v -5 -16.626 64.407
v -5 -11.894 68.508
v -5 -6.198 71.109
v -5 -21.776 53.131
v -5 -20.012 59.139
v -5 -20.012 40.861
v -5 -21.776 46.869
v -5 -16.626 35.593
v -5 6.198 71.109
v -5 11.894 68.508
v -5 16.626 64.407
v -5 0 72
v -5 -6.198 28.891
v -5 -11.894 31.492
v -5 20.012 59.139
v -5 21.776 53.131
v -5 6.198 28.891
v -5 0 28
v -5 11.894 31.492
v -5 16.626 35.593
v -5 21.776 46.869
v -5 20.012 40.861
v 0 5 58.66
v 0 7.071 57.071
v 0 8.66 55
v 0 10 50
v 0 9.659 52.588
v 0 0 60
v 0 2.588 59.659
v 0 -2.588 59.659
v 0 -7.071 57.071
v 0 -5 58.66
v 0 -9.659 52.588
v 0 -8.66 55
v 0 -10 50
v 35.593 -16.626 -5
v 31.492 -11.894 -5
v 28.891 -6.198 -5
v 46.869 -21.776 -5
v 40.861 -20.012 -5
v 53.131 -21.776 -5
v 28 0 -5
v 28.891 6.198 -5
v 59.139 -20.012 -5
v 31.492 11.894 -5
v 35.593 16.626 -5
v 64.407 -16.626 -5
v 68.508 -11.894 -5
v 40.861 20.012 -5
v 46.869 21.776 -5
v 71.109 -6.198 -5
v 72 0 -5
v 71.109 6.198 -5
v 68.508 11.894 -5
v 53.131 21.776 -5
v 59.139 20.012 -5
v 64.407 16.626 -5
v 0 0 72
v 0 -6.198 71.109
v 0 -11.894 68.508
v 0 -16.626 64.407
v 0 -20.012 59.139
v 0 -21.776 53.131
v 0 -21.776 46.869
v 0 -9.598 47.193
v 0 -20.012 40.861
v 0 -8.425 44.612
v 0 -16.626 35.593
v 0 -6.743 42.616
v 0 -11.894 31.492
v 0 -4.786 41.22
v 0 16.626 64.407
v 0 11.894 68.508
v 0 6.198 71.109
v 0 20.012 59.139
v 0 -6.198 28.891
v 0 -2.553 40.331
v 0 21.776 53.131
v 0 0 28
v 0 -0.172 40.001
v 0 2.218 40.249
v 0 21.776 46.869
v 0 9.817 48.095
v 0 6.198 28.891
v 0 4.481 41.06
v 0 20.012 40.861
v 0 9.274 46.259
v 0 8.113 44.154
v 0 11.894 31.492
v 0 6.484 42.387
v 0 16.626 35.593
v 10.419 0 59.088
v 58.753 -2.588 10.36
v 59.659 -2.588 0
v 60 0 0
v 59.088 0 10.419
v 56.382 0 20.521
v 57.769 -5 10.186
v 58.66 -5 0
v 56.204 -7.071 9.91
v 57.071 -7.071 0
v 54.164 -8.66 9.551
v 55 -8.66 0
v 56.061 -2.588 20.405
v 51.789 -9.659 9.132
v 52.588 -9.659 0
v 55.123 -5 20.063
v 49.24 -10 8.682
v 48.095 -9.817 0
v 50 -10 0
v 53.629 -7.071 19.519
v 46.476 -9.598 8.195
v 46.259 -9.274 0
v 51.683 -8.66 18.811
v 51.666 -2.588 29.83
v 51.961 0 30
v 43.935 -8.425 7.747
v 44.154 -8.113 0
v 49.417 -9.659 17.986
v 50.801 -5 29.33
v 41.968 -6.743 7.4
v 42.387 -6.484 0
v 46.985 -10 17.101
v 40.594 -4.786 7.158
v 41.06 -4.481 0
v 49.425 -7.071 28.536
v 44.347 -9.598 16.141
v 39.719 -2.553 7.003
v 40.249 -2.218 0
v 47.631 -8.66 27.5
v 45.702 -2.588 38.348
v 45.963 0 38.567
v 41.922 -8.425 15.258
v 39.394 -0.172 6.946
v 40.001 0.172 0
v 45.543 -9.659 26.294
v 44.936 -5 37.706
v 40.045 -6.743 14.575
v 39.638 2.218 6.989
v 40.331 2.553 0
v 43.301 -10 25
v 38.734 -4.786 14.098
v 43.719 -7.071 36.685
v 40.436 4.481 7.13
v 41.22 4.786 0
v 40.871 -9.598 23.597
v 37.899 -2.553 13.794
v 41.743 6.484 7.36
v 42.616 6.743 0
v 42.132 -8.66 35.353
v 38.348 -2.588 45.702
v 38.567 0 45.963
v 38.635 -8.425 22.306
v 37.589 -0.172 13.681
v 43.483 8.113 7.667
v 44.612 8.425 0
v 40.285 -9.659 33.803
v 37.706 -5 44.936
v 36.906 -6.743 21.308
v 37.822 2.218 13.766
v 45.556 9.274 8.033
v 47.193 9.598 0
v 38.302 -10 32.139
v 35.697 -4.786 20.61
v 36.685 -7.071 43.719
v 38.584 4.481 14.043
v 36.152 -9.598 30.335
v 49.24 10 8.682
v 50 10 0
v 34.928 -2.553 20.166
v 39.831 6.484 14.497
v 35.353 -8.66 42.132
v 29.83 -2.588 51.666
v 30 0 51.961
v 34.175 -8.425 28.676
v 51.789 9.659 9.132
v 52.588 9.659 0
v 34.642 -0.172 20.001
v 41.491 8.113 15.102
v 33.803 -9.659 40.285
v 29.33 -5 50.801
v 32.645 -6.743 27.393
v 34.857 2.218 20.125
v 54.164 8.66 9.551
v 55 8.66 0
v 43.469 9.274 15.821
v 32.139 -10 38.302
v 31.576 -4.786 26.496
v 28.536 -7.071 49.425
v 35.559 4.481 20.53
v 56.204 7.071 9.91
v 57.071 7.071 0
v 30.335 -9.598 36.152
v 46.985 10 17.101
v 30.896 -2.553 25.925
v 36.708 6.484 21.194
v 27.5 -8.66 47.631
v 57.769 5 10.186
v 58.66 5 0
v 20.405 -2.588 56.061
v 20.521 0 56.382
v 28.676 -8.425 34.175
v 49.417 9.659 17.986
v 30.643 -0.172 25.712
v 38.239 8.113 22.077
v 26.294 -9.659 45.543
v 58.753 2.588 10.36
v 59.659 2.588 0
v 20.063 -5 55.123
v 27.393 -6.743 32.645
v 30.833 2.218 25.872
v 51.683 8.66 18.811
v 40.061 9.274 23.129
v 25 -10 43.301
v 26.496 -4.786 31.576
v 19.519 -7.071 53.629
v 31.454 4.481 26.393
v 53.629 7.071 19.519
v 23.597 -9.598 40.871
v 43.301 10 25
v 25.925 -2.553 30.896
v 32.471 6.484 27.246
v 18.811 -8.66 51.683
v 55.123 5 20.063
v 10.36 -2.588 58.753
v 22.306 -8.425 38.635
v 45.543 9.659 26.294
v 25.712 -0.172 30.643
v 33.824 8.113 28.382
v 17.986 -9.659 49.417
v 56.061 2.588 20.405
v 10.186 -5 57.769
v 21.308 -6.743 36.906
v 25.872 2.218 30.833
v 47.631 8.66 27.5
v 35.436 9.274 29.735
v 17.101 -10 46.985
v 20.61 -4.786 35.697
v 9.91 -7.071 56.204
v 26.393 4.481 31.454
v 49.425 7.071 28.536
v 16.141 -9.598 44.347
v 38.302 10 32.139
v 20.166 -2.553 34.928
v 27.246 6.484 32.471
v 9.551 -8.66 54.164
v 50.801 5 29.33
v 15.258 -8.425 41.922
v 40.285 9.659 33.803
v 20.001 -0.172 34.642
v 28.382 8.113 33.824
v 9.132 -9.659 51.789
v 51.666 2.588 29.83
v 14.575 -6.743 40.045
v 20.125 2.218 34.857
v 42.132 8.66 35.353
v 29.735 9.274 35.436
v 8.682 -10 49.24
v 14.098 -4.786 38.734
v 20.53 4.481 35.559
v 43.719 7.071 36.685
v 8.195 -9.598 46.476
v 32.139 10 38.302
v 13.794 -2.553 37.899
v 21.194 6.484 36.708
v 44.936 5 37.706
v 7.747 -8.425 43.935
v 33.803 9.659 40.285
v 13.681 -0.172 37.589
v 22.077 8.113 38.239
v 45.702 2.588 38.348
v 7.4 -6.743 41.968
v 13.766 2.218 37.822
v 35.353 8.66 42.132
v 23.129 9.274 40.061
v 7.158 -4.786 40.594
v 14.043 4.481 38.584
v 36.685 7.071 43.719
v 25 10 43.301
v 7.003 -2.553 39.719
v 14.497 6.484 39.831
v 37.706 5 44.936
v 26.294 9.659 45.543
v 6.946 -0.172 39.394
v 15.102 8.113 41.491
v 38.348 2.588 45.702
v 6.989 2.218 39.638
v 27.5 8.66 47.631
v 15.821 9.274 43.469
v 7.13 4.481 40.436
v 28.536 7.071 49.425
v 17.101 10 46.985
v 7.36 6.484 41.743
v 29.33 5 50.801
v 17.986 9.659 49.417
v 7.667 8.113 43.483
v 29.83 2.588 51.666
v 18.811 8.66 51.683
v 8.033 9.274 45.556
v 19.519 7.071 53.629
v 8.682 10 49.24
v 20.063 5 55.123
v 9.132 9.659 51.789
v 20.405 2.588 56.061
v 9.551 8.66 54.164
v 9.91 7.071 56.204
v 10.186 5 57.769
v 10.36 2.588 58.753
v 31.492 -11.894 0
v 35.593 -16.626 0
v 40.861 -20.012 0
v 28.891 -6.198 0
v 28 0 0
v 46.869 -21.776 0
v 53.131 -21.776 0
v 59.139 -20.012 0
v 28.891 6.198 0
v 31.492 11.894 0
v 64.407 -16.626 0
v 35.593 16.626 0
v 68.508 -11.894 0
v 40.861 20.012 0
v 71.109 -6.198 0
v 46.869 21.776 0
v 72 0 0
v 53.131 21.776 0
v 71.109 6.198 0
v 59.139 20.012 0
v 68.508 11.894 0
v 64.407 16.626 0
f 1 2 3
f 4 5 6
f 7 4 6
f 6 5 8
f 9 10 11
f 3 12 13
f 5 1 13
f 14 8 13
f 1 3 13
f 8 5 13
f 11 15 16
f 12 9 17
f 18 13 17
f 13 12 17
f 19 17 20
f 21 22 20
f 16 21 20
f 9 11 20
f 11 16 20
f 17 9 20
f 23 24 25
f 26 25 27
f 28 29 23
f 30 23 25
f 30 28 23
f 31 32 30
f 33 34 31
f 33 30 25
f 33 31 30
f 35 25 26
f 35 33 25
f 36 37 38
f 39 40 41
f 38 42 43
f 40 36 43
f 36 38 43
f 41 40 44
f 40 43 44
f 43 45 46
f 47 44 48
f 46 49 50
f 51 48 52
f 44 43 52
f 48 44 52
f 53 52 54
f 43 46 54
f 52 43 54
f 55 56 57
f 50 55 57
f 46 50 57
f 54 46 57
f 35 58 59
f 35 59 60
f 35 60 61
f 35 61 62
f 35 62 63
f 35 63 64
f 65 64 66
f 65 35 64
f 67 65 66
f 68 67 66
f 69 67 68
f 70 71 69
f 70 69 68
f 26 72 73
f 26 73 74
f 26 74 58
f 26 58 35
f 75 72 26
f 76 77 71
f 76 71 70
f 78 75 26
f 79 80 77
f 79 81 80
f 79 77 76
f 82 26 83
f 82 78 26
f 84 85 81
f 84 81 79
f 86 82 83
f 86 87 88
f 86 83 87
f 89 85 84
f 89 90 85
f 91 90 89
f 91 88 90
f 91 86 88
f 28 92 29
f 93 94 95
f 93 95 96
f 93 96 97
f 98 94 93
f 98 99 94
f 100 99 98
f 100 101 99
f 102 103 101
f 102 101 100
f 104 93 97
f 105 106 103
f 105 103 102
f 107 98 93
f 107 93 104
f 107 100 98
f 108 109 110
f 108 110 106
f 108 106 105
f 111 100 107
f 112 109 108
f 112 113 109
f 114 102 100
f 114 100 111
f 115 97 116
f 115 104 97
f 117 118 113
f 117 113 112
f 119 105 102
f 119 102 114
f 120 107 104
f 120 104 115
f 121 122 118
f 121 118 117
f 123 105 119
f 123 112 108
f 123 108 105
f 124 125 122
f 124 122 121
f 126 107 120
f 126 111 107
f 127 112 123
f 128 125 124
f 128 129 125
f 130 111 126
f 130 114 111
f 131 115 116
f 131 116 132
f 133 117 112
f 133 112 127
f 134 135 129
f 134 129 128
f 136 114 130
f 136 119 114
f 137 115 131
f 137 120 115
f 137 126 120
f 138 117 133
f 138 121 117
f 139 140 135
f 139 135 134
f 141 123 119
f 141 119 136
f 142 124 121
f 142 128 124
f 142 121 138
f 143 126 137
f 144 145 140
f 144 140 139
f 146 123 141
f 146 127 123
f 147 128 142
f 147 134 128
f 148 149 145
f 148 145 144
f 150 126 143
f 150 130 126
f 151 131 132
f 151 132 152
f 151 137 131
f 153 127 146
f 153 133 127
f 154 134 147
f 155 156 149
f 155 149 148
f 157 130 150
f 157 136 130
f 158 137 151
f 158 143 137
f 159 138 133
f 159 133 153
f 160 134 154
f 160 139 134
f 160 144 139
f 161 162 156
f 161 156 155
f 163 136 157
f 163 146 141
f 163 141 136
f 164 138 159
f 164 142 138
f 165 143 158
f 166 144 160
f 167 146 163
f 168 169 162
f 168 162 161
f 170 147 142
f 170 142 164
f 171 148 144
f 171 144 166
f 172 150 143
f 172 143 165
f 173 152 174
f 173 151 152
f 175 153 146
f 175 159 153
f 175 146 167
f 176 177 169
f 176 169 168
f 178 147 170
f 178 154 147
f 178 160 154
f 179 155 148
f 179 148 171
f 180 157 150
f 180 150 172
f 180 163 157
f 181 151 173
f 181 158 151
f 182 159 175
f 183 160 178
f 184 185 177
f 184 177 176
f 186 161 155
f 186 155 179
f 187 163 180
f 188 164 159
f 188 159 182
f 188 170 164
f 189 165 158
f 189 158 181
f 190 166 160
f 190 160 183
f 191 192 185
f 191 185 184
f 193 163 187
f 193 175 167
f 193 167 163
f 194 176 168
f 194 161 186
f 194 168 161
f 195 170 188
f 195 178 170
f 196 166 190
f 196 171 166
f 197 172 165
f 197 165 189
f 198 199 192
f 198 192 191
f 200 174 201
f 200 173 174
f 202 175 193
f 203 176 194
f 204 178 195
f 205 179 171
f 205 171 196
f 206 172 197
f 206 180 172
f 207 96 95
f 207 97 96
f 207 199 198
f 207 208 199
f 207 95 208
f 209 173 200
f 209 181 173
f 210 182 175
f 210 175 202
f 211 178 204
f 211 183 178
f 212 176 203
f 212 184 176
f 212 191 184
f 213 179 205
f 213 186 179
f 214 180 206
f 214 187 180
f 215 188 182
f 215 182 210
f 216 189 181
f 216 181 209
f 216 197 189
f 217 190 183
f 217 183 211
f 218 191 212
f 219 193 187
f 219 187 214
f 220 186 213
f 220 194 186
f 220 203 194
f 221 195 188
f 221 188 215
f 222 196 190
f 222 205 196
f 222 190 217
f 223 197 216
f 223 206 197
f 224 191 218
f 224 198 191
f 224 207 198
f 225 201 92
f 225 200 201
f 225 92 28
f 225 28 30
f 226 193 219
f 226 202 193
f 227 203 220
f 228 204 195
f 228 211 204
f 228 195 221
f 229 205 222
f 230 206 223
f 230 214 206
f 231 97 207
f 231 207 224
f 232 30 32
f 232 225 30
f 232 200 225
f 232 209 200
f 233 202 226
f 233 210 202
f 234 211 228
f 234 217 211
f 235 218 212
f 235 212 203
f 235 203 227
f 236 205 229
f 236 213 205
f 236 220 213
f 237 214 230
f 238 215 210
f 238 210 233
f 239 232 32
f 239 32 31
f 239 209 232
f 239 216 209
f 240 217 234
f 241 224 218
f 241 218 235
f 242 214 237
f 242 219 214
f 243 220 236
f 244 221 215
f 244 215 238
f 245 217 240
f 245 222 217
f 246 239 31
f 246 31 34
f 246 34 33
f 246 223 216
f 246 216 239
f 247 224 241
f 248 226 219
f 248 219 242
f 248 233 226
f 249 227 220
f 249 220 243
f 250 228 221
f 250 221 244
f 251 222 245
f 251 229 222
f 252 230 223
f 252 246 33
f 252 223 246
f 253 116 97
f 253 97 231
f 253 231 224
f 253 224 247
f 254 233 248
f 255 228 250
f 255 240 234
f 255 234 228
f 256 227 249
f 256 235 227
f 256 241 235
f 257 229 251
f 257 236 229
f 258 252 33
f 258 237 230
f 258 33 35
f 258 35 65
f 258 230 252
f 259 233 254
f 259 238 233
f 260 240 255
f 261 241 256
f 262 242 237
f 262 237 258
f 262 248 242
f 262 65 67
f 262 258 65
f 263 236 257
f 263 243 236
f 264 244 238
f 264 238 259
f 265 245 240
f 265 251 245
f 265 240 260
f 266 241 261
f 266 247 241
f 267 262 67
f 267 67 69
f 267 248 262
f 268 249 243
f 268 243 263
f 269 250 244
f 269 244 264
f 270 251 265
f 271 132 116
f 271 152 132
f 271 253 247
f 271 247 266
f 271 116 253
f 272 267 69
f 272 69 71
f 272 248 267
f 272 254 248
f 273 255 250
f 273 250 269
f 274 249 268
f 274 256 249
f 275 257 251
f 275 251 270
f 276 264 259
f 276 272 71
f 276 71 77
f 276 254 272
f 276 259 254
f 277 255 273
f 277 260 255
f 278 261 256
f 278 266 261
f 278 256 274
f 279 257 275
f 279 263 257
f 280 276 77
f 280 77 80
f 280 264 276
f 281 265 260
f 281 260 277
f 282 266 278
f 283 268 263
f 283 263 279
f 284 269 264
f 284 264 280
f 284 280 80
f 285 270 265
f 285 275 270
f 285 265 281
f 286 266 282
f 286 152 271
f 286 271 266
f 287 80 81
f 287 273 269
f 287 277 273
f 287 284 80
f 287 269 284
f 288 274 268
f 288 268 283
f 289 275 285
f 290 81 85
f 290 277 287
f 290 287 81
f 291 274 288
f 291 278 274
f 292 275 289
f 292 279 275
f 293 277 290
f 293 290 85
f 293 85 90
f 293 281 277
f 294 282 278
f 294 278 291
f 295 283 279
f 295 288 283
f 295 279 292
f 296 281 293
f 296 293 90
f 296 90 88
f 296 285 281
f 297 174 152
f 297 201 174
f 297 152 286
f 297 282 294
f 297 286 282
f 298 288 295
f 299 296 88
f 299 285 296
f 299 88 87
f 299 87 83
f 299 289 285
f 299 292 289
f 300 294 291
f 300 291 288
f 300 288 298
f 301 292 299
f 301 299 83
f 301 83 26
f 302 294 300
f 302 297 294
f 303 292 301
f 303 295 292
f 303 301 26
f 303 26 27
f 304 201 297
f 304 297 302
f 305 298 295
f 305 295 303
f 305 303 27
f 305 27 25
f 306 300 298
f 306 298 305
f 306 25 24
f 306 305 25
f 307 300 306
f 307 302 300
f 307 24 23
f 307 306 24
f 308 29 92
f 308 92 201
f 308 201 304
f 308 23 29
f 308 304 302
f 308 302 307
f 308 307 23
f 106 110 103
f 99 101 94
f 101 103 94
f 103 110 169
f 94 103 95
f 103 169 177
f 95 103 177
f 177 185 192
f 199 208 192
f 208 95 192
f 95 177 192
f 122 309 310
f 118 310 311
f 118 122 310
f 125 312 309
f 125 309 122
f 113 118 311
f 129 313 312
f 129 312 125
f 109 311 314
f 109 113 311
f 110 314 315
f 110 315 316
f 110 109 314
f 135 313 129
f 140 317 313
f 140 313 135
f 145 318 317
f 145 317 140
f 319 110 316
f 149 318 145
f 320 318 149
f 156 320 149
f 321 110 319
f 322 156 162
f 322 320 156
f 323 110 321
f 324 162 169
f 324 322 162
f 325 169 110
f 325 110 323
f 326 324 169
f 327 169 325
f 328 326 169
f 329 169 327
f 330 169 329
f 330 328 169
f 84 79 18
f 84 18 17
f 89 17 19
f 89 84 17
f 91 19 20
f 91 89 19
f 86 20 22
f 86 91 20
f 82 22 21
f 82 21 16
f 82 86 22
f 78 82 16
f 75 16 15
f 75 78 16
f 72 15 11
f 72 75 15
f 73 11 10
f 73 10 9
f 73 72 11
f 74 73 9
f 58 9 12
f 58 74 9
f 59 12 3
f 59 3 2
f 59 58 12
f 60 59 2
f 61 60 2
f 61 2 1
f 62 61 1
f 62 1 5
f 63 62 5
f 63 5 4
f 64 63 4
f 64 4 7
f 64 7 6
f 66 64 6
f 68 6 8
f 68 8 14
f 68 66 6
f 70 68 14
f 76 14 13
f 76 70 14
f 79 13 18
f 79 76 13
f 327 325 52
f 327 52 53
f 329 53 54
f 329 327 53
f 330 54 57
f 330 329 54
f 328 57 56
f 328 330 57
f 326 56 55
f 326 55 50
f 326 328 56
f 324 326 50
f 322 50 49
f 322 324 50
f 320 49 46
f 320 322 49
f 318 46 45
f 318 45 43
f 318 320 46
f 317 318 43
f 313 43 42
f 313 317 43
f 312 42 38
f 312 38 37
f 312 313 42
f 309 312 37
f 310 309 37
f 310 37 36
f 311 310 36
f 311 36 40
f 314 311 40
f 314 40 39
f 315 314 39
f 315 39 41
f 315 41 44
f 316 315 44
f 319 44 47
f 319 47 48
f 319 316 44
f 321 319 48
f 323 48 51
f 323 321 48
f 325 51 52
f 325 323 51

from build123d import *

# Parameters (mm, degrees)
SWEEP_2_PROFILE_R = 10
SKETCH_11_R       = 22
EXTRUDE_4_DEPTH   = 5
SKETCH_16_R       = 22
EXTRUDE_7_DEPTH   = 5


with BuildPart() as part:
    # 扫描2: sweep along a path in 草图1
    with BuildLine(Plane(origin=(0, 0, 0), x_dir=(1, 0, 0), z_dir=(0, 1, 0))) as sweep_2_path:
        ThreePointArc((50, 0), (35.3553, -35.3553), (0, -50))
    # 扫描2 profile (on start of the path) → 扫描2 (sweep)
    with BuildSketch(Plane(origin=(50, 0, 0), x_dir=(0.9999999999964432, 0, 2.6671391793895655e-06), z_dir=(-2.6671391793895655e-06, 0, 0.9999999999964432))):
        Circle(SWEEP_2_PROFILE_R)
    sweep(path=sweep_2_path.line)

    # 草图11 → 凸台-拉伸4 (add)
    with BuildSketch(Plane.XY):
        with Locations((50, 0)):
            Circle(SKETCH_11_R)
    extrude(amount=-EXTRUDE_4_DEPTH)

    # 草图16 → 凸台-拉伸7 (add)
    with BuildSketch(Plane(origin=(0, 0, 0), x_dir=(0, 0, -1), z_dir=(1, 0, 0))):
        with Locations((-50, 0)):
            Circle(SKETCH_16_R)
    extrude(amount=-EXTRUDE_7_DEPTH)


solid = part.part
